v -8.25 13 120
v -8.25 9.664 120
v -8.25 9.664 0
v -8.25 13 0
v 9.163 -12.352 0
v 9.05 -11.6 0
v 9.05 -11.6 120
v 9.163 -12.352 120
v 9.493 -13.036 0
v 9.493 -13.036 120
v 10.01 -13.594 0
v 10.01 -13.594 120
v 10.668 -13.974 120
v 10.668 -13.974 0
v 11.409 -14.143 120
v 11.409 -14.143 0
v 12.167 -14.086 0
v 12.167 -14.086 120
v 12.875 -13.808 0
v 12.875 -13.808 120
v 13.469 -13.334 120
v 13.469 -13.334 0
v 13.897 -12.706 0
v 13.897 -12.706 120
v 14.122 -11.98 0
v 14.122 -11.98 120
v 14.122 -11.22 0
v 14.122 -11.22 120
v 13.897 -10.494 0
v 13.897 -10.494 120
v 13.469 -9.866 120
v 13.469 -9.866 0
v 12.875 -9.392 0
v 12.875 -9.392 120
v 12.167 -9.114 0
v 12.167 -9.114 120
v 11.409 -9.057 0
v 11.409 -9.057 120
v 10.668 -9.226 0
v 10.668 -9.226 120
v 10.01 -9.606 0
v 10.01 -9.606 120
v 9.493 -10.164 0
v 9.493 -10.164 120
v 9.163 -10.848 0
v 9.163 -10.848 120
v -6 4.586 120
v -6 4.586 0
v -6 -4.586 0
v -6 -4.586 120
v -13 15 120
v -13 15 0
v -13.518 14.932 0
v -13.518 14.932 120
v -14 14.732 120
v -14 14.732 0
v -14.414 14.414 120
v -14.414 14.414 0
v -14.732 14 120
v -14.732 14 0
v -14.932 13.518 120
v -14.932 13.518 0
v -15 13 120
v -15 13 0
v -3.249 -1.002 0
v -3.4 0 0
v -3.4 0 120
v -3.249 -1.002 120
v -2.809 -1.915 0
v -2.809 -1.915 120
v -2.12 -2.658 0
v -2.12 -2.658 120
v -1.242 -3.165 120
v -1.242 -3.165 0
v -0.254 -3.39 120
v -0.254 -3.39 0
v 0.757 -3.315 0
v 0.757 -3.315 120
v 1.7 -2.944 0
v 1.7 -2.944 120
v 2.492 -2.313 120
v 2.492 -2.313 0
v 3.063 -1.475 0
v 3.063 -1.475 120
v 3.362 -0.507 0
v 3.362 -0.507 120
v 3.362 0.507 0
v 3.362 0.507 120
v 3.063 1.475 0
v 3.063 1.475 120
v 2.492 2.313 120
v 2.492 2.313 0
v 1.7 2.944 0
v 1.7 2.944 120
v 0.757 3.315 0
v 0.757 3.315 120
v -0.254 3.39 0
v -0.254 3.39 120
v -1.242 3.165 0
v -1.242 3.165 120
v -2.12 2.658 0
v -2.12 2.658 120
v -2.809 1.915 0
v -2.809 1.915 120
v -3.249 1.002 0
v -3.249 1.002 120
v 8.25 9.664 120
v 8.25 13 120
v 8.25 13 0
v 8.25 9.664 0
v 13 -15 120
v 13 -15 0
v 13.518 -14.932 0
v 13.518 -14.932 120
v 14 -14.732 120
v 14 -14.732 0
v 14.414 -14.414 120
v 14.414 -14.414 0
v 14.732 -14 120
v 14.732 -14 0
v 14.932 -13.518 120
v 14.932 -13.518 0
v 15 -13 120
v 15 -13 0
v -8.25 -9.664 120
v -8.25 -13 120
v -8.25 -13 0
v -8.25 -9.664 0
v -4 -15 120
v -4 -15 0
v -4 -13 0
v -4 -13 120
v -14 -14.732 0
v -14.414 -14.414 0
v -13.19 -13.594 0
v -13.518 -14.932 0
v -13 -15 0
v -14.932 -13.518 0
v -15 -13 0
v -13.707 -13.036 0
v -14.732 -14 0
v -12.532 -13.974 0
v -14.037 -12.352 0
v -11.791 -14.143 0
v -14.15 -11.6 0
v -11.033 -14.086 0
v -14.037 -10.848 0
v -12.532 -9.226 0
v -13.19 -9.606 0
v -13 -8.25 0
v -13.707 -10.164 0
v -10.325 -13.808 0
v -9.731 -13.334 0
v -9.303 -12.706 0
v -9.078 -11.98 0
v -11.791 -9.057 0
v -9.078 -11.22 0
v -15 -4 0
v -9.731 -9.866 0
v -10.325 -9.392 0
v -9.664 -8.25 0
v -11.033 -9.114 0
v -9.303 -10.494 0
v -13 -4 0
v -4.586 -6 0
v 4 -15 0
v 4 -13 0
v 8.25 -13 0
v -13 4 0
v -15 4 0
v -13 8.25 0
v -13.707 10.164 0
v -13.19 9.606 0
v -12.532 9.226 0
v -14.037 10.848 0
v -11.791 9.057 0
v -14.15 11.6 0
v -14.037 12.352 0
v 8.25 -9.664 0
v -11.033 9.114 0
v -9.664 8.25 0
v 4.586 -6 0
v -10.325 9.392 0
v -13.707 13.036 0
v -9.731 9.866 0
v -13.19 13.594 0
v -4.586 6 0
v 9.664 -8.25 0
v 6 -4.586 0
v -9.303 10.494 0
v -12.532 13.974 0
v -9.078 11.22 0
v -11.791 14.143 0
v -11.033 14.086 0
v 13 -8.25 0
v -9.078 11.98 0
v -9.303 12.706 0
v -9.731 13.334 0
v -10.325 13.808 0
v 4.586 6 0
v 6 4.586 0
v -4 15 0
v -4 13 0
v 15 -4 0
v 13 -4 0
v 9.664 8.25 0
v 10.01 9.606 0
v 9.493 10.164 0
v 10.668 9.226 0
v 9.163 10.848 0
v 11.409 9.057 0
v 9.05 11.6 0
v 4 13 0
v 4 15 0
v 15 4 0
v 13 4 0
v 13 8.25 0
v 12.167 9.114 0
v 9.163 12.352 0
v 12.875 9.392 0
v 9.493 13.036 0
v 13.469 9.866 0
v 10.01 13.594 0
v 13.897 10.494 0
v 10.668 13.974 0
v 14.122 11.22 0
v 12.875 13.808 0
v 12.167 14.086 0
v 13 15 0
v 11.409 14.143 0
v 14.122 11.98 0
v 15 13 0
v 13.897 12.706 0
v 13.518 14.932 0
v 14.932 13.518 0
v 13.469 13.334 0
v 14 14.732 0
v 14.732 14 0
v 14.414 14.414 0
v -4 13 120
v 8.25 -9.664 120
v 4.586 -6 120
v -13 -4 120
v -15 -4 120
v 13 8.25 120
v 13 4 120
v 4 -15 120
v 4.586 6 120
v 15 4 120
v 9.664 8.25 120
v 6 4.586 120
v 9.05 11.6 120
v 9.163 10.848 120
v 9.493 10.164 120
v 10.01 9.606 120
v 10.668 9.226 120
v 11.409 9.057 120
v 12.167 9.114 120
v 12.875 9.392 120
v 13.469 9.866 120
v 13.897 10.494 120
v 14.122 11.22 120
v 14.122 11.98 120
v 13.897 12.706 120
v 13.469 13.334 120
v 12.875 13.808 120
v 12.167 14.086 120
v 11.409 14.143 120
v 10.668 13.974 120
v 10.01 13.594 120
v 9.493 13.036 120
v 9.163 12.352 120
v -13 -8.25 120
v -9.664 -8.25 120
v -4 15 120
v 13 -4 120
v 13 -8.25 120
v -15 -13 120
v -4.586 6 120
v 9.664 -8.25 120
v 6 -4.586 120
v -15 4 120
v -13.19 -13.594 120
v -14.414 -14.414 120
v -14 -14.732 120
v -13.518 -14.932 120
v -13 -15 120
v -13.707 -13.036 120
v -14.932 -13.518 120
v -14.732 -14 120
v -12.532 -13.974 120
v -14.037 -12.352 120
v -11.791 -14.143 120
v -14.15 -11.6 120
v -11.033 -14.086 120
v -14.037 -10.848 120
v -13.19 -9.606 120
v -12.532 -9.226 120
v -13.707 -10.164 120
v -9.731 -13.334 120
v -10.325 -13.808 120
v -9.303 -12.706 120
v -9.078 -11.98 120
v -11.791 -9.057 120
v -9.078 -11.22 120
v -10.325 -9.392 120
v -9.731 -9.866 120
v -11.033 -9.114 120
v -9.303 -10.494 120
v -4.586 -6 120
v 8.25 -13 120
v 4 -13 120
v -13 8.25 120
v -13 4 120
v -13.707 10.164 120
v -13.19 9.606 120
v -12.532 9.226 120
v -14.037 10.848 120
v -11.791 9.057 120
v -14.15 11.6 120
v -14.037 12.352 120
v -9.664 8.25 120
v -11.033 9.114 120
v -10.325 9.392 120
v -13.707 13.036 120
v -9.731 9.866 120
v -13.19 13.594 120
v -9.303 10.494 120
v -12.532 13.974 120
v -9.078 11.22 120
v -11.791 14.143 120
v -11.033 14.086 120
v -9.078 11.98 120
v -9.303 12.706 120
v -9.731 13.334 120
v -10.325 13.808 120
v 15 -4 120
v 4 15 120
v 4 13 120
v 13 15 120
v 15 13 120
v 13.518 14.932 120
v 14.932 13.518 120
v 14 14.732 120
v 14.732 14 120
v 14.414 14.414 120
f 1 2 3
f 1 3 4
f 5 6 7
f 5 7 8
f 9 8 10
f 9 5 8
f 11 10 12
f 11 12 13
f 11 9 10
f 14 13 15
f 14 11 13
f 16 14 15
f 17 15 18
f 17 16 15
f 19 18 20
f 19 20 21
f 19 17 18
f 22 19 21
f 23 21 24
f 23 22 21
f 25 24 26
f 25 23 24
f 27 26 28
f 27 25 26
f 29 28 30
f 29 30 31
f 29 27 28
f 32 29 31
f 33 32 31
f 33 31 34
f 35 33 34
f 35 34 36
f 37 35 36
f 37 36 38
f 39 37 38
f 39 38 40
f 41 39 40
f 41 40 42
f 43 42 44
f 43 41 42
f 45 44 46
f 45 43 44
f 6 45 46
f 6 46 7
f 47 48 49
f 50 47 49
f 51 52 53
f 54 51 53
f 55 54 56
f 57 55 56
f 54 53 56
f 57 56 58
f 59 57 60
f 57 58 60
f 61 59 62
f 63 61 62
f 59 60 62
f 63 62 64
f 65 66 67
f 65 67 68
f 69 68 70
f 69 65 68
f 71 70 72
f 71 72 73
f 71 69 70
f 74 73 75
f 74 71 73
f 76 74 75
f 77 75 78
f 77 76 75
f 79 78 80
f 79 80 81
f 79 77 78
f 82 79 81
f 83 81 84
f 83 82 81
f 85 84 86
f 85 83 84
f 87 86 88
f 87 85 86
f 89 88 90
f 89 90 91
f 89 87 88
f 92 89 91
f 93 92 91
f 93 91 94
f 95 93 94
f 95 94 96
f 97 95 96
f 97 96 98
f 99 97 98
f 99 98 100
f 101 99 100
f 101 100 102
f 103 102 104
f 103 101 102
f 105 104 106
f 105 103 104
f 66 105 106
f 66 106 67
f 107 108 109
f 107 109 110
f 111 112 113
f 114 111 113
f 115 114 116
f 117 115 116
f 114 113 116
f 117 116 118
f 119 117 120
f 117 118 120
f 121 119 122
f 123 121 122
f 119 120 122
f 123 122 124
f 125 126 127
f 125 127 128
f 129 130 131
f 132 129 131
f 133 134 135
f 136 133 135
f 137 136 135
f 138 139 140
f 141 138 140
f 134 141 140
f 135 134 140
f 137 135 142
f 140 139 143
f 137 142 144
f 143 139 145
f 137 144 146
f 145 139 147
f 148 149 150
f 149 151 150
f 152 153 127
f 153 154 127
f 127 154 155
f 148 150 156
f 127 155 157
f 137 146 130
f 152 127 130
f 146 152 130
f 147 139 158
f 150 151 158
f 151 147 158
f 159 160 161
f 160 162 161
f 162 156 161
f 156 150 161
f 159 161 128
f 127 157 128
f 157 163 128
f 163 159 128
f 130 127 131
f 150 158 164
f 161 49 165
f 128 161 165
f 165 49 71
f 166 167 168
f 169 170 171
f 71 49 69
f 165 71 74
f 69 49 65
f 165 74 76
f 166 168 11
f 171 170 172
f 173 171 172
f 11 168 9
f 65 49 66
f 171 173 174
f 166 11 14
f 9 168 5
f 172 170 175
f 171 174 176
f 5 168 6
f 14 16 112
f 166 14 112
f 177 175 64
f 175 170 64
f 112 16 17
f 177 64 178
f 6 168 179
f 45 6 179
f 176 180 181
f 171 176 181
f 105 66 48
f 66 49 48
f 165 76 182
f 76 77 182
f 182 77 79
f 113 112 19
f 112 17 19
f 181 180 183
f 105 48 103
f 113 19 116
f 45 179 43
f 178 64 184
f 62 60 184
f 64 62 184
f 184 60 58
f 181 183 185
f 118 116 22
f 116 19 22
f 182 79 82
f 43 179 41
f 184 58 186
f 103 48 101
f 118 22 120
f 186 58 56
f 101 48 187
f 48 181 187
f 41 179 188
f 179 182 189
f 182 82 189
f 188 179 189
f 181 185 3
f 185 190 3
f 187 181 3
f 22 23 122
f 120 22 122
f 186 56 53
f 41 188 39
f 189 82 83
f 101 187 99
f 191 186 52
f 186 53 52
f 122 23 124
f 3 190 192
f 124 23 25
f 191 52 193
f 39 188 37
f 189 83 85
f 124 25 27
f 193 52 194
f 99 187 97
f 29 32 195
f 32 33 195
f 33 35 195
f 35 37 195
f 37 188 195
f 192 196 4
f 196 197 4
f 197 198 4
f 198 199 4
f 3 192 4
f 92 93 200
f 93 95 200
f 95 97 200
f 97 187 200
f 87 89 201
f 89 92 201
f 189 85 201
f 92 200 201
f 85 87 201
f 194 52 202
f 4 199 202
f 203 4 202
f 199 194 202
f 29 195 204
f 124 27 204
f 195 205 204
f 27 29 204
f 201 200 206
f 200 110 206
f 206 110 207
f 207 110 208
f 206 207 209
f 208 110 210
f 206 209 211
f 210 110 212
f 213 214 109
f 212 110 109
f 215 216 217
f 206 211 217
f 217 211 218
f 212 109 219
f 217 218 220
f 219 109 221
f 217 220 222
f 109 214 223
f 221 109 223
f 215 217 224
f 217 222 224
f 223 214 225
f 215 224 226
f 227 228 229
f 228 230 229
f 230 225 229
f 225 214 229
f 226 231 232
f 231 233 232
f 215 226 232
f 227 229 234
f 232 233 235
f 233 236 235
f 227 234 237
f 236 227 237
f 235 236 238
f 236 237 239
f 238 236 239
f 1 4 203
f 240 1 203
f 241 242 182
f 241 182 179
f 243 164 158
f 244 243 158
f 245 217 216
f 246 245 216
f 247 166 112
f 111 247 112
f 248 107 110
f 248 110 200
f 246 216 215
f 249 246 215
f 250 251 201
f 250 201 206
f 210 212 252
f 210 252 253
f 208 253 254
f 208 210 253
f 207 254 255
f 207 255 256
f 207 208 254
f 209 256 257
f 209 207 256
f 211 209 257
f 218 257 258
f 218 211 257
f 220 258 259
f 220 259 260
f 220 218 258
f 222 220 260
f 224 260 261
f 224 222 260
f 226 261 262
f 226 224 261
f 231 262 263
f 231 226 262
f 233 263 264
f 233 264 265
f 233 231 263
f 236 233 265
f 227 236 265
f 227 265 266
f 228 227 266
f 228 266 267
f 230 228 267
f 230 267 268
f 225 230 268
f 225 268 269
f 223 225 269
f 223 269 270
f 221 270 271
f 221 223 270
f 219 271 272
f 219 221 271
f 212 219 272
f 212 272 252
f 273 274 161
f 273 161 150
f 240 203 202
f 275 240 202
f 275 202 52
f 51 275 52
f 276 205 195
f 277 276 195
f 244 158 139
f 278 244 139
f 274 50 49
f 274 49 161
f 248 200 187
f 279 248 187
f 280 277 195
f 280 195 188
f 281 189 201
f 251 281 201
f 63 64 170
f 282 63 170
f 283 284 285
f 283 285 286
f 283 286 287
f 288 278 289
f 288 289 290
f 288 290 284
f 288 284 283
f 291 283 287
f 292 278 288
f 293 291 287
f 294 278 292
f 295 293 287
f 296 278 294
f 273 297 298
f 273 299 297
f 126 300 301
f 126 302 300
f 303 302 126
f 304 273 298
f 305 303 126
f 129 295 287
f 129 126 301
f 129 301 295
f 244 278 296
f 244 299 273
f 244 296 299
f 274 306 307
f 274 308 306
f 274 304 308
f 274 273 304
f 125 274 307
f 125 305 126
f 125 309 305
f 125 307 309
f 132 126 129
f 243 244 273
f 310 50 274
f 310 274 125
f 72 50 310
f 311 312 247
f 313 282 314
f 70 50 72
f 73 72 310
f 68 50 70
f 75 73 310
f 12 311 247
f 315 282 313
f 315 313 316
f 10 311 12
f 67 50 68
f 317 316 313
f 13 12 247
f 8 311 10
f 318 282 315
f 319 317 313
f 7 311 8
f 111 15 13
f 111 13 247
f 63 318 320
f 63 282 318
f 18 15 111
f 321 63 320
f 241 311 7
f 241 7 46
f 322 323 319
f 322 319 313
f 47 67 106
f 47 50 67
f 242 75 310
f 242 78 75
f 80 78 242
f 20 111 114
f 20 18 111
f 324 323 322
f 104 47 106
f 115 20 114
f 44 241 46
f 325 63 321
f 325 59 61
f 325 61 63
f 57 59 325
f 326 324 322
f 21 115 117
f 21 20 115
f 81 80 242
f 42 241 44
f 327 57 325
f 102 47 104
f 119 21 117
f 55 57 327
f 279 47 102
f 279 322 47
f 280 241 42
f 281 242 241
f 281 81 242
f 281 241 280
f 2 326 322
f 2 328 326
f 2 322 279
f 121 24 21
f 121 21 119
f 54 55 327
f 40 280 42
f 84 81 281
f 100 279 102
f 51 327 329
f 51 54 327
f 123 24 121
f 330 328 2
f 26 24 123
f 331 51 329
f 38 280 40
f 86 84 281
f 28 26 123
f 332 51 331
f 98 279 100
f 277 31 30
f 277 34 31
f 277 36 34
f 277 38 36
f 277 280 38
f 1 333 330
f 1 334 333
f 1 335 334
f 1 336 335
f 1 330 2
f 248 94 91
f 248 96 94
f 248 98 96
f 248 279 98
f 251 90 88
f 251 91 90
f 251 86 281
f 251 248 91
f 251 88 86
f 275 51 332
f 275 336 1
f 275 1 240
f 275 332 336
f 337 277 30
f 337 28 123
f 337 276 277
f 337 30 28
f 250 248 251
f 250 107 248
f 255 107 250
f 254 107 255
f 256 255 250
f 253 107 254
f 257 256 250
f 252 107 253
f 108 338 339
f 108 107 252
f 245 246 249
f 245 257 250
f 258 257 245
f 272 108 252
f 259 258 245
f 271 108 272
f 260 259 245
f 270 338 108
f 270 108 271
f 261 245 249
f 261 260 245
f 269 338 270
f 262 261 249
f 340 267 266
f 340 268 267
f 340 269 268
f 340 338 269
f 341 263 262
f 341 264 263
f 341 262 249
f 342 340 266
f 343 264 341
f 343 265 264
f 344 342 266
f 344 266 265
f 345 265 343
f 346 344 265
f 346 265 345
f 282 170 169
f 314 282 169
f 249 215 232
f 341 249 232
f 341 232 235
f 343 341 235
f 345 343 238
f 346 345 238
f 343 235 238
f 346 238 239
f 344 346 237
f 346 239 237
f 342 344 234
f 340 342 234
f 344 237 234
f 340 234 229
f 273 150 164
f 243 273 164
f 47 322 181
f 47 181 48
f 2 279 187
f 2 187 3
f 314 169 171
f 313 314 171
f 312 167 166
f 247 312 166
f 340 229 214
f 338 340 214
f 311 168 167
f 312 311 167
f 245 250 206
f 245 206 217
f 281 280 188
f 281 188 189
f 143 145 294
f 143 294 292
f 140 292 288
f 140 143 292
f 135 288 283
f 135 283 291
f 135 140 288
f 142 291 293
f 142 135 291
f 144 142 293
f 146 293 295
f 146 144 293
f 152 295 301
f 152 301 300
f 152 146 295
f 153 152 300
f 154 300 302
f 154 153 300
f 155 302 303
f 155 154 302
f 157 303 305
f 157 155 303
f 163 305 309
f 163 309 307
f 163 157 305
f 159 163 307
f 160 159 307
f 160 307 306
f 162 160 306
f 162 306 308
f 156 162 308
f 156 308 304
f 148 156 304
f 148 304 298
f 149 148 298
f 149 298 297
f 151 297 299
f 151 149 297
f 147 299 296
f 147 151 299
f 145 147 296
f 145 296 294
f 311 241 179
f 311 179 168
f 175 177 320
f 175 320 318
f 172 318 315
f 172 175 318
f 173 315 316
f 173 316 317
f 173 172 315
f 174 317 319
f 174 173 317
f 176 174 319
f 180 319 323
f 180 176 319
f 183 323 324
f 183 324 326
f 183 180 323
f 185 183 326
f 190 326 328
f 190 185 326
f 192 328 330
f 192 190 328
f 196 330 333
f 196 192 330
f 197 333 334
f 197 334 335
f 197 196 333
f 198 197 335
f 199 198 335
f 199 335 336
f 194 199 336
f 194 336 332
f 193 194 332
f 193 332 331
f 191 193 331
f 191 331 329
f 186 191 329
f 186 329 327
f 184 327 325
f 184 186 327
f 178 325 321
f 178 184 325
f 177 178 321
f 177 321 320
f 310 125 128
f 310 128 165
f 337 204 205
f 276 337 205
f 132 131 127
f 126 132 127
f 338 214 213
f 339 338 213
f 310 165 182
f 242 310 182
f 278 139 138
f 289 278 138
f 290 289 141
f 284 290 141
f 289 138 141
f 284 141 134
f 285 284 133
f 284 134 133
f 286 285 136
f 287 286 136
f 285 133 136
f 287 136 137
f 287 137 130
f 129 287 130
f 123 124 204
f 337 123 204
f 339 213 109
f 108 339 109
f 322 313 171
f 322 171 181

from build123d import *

# Parameters (mm, degrees)
SKETCH1_R           = 2.55
SKETCH1_R_2         = 3.4
BOSS_EXTRUDE1_DEPTH = 120


with BuildPart() as part:
    # Sketch1 → Boss-Extrude1 (new body)
    with BuildSketch(Plane.XY):
        with BuildLine():
            Line((-13, -15), (-4, -15))
            Line((-4, -15), (-4, -13))
            Line((-4, -13), (-8.25, -13))
            Line((-8.25, -13), (-8.25, -9.664213562))
            Line((-8.25, -9.664213562), (-4.585786438, -6))
            Line((-4.585786438, -6), (4.585786438, -6))
            Line((4.585786438, -6), (8.25, -9.664213562))
            Line((8.25, -9.664213562), (8.25, -13))
            Line((8.25, -13), (4, -13))
            Line((4, -13), (4, -15))
            Line((4, -15), (13, -15))
            ThreePointArc((13, -15), (14.414213562, -14.414213562), (15, -13))
            Line((15, -13), (15, -4))
            Line((15, -4), (13, -4))
            Line((13, -4), (13, -8.25))
            Line((13, -8.25), (9.664213562, -8.25))
            Line((9.664213562, -8.25), (6, -4.585786438))
            Line((6, -4.585786438), (6, 4.585786438))
            Line((6, 4.585786438), (9.664213562, 8.25))
            Line((9.664213562, 8.25), (13, 8.25))
            Line((13, 8.25), (13, 4))
            Line((13, 4), (15, 4))
            Line((15, 4), (15, 13))
            ThreePointArc((15, 13), (14.414213562, 14.414213562), (13, 15))
            Line((13, 15), (4, 15))
            Line((4, 15), (4, 13))
            Line((4, 13), (8.25, 13))
            Line((8.25, 13), (8.25, 9.664213562))
            Line((8.25, 9.664213562), (4.585786438, 6))
            Line((4.585786438, 6), (-4.585786438, 6))
            Line((-4.585786438, 6), (-8.25, 9.664213562))
            Line((-8.25, 9.664213562), (-8.25, 13))
            Line((-8.25, 13), (-4, 13))
            Line((-4, 13), (-4, 15))
            Line((-4, 15), (-13, 15))
            ThreePointArc((-13, 15), (-14.414213562, 14.414213562), (-15, 13))
            Line((-15, 13), (-15, 4))
            Line((-15, 4), (-13, 4))
            Line((-13, 4), (-13, 8.25))
            Line((-13, 8.25), (-9.664213562, 8.25))
            Line((-9.664213562, 8.25), (-6, 4.585786438))
            Line((-6, 4.585786438), (-6, -4.585786438))
            Line((-6, -4.585786438), (-9.664213562, -8.25))
            Line((-9.664213562, -8.25), (-13, -8.25))
            Line((-13, -8.25), (-13, -4))
            Line((-13, -4), (-15, -4))
            Line((-15, -4), (-15, -13))
            ThreePointArc((-15, -13), (-14.414213562, -14.414213562), (-13, -15))
        make_face()
        with Locations(Location((-11.6, 11.6, 0), (0, 0, 180))):  # turned: the seam where the file's is
            Circle(SKETCH1_R, mode=Mode.SUBTRACT)
        with Locations(Location((0, 0, 0), (0, 0, 180))):  # turned: the seam where the file's is
            Circle(SKETCH1_R_2, mode=Mode.SUBTRACT)
        with Locations(Location((-11.6, -11.6, 0), (0, 0, 180))):  # turned: the seam where the file's is
            Circle(SKETCH1_R, mode=Mode.SUBTRACT)
        with Locations(Location((11.6, -11.6, 0), (0, 0, 180))):  # turned: the seam where the file's is
            Circle(SKETCH1_R, mode=Mode.SUBTRACT)
        with Locations(Location((11.6, 11.6, 0), (0, 0, 180))):  # turned: the seam where the file's is
            Circle(SKETCH1_R, mode=Mode.SUBTRACT)
    extrude(amount=BOSS_EXTRUDE1_DEPTH)


solid = part.part
